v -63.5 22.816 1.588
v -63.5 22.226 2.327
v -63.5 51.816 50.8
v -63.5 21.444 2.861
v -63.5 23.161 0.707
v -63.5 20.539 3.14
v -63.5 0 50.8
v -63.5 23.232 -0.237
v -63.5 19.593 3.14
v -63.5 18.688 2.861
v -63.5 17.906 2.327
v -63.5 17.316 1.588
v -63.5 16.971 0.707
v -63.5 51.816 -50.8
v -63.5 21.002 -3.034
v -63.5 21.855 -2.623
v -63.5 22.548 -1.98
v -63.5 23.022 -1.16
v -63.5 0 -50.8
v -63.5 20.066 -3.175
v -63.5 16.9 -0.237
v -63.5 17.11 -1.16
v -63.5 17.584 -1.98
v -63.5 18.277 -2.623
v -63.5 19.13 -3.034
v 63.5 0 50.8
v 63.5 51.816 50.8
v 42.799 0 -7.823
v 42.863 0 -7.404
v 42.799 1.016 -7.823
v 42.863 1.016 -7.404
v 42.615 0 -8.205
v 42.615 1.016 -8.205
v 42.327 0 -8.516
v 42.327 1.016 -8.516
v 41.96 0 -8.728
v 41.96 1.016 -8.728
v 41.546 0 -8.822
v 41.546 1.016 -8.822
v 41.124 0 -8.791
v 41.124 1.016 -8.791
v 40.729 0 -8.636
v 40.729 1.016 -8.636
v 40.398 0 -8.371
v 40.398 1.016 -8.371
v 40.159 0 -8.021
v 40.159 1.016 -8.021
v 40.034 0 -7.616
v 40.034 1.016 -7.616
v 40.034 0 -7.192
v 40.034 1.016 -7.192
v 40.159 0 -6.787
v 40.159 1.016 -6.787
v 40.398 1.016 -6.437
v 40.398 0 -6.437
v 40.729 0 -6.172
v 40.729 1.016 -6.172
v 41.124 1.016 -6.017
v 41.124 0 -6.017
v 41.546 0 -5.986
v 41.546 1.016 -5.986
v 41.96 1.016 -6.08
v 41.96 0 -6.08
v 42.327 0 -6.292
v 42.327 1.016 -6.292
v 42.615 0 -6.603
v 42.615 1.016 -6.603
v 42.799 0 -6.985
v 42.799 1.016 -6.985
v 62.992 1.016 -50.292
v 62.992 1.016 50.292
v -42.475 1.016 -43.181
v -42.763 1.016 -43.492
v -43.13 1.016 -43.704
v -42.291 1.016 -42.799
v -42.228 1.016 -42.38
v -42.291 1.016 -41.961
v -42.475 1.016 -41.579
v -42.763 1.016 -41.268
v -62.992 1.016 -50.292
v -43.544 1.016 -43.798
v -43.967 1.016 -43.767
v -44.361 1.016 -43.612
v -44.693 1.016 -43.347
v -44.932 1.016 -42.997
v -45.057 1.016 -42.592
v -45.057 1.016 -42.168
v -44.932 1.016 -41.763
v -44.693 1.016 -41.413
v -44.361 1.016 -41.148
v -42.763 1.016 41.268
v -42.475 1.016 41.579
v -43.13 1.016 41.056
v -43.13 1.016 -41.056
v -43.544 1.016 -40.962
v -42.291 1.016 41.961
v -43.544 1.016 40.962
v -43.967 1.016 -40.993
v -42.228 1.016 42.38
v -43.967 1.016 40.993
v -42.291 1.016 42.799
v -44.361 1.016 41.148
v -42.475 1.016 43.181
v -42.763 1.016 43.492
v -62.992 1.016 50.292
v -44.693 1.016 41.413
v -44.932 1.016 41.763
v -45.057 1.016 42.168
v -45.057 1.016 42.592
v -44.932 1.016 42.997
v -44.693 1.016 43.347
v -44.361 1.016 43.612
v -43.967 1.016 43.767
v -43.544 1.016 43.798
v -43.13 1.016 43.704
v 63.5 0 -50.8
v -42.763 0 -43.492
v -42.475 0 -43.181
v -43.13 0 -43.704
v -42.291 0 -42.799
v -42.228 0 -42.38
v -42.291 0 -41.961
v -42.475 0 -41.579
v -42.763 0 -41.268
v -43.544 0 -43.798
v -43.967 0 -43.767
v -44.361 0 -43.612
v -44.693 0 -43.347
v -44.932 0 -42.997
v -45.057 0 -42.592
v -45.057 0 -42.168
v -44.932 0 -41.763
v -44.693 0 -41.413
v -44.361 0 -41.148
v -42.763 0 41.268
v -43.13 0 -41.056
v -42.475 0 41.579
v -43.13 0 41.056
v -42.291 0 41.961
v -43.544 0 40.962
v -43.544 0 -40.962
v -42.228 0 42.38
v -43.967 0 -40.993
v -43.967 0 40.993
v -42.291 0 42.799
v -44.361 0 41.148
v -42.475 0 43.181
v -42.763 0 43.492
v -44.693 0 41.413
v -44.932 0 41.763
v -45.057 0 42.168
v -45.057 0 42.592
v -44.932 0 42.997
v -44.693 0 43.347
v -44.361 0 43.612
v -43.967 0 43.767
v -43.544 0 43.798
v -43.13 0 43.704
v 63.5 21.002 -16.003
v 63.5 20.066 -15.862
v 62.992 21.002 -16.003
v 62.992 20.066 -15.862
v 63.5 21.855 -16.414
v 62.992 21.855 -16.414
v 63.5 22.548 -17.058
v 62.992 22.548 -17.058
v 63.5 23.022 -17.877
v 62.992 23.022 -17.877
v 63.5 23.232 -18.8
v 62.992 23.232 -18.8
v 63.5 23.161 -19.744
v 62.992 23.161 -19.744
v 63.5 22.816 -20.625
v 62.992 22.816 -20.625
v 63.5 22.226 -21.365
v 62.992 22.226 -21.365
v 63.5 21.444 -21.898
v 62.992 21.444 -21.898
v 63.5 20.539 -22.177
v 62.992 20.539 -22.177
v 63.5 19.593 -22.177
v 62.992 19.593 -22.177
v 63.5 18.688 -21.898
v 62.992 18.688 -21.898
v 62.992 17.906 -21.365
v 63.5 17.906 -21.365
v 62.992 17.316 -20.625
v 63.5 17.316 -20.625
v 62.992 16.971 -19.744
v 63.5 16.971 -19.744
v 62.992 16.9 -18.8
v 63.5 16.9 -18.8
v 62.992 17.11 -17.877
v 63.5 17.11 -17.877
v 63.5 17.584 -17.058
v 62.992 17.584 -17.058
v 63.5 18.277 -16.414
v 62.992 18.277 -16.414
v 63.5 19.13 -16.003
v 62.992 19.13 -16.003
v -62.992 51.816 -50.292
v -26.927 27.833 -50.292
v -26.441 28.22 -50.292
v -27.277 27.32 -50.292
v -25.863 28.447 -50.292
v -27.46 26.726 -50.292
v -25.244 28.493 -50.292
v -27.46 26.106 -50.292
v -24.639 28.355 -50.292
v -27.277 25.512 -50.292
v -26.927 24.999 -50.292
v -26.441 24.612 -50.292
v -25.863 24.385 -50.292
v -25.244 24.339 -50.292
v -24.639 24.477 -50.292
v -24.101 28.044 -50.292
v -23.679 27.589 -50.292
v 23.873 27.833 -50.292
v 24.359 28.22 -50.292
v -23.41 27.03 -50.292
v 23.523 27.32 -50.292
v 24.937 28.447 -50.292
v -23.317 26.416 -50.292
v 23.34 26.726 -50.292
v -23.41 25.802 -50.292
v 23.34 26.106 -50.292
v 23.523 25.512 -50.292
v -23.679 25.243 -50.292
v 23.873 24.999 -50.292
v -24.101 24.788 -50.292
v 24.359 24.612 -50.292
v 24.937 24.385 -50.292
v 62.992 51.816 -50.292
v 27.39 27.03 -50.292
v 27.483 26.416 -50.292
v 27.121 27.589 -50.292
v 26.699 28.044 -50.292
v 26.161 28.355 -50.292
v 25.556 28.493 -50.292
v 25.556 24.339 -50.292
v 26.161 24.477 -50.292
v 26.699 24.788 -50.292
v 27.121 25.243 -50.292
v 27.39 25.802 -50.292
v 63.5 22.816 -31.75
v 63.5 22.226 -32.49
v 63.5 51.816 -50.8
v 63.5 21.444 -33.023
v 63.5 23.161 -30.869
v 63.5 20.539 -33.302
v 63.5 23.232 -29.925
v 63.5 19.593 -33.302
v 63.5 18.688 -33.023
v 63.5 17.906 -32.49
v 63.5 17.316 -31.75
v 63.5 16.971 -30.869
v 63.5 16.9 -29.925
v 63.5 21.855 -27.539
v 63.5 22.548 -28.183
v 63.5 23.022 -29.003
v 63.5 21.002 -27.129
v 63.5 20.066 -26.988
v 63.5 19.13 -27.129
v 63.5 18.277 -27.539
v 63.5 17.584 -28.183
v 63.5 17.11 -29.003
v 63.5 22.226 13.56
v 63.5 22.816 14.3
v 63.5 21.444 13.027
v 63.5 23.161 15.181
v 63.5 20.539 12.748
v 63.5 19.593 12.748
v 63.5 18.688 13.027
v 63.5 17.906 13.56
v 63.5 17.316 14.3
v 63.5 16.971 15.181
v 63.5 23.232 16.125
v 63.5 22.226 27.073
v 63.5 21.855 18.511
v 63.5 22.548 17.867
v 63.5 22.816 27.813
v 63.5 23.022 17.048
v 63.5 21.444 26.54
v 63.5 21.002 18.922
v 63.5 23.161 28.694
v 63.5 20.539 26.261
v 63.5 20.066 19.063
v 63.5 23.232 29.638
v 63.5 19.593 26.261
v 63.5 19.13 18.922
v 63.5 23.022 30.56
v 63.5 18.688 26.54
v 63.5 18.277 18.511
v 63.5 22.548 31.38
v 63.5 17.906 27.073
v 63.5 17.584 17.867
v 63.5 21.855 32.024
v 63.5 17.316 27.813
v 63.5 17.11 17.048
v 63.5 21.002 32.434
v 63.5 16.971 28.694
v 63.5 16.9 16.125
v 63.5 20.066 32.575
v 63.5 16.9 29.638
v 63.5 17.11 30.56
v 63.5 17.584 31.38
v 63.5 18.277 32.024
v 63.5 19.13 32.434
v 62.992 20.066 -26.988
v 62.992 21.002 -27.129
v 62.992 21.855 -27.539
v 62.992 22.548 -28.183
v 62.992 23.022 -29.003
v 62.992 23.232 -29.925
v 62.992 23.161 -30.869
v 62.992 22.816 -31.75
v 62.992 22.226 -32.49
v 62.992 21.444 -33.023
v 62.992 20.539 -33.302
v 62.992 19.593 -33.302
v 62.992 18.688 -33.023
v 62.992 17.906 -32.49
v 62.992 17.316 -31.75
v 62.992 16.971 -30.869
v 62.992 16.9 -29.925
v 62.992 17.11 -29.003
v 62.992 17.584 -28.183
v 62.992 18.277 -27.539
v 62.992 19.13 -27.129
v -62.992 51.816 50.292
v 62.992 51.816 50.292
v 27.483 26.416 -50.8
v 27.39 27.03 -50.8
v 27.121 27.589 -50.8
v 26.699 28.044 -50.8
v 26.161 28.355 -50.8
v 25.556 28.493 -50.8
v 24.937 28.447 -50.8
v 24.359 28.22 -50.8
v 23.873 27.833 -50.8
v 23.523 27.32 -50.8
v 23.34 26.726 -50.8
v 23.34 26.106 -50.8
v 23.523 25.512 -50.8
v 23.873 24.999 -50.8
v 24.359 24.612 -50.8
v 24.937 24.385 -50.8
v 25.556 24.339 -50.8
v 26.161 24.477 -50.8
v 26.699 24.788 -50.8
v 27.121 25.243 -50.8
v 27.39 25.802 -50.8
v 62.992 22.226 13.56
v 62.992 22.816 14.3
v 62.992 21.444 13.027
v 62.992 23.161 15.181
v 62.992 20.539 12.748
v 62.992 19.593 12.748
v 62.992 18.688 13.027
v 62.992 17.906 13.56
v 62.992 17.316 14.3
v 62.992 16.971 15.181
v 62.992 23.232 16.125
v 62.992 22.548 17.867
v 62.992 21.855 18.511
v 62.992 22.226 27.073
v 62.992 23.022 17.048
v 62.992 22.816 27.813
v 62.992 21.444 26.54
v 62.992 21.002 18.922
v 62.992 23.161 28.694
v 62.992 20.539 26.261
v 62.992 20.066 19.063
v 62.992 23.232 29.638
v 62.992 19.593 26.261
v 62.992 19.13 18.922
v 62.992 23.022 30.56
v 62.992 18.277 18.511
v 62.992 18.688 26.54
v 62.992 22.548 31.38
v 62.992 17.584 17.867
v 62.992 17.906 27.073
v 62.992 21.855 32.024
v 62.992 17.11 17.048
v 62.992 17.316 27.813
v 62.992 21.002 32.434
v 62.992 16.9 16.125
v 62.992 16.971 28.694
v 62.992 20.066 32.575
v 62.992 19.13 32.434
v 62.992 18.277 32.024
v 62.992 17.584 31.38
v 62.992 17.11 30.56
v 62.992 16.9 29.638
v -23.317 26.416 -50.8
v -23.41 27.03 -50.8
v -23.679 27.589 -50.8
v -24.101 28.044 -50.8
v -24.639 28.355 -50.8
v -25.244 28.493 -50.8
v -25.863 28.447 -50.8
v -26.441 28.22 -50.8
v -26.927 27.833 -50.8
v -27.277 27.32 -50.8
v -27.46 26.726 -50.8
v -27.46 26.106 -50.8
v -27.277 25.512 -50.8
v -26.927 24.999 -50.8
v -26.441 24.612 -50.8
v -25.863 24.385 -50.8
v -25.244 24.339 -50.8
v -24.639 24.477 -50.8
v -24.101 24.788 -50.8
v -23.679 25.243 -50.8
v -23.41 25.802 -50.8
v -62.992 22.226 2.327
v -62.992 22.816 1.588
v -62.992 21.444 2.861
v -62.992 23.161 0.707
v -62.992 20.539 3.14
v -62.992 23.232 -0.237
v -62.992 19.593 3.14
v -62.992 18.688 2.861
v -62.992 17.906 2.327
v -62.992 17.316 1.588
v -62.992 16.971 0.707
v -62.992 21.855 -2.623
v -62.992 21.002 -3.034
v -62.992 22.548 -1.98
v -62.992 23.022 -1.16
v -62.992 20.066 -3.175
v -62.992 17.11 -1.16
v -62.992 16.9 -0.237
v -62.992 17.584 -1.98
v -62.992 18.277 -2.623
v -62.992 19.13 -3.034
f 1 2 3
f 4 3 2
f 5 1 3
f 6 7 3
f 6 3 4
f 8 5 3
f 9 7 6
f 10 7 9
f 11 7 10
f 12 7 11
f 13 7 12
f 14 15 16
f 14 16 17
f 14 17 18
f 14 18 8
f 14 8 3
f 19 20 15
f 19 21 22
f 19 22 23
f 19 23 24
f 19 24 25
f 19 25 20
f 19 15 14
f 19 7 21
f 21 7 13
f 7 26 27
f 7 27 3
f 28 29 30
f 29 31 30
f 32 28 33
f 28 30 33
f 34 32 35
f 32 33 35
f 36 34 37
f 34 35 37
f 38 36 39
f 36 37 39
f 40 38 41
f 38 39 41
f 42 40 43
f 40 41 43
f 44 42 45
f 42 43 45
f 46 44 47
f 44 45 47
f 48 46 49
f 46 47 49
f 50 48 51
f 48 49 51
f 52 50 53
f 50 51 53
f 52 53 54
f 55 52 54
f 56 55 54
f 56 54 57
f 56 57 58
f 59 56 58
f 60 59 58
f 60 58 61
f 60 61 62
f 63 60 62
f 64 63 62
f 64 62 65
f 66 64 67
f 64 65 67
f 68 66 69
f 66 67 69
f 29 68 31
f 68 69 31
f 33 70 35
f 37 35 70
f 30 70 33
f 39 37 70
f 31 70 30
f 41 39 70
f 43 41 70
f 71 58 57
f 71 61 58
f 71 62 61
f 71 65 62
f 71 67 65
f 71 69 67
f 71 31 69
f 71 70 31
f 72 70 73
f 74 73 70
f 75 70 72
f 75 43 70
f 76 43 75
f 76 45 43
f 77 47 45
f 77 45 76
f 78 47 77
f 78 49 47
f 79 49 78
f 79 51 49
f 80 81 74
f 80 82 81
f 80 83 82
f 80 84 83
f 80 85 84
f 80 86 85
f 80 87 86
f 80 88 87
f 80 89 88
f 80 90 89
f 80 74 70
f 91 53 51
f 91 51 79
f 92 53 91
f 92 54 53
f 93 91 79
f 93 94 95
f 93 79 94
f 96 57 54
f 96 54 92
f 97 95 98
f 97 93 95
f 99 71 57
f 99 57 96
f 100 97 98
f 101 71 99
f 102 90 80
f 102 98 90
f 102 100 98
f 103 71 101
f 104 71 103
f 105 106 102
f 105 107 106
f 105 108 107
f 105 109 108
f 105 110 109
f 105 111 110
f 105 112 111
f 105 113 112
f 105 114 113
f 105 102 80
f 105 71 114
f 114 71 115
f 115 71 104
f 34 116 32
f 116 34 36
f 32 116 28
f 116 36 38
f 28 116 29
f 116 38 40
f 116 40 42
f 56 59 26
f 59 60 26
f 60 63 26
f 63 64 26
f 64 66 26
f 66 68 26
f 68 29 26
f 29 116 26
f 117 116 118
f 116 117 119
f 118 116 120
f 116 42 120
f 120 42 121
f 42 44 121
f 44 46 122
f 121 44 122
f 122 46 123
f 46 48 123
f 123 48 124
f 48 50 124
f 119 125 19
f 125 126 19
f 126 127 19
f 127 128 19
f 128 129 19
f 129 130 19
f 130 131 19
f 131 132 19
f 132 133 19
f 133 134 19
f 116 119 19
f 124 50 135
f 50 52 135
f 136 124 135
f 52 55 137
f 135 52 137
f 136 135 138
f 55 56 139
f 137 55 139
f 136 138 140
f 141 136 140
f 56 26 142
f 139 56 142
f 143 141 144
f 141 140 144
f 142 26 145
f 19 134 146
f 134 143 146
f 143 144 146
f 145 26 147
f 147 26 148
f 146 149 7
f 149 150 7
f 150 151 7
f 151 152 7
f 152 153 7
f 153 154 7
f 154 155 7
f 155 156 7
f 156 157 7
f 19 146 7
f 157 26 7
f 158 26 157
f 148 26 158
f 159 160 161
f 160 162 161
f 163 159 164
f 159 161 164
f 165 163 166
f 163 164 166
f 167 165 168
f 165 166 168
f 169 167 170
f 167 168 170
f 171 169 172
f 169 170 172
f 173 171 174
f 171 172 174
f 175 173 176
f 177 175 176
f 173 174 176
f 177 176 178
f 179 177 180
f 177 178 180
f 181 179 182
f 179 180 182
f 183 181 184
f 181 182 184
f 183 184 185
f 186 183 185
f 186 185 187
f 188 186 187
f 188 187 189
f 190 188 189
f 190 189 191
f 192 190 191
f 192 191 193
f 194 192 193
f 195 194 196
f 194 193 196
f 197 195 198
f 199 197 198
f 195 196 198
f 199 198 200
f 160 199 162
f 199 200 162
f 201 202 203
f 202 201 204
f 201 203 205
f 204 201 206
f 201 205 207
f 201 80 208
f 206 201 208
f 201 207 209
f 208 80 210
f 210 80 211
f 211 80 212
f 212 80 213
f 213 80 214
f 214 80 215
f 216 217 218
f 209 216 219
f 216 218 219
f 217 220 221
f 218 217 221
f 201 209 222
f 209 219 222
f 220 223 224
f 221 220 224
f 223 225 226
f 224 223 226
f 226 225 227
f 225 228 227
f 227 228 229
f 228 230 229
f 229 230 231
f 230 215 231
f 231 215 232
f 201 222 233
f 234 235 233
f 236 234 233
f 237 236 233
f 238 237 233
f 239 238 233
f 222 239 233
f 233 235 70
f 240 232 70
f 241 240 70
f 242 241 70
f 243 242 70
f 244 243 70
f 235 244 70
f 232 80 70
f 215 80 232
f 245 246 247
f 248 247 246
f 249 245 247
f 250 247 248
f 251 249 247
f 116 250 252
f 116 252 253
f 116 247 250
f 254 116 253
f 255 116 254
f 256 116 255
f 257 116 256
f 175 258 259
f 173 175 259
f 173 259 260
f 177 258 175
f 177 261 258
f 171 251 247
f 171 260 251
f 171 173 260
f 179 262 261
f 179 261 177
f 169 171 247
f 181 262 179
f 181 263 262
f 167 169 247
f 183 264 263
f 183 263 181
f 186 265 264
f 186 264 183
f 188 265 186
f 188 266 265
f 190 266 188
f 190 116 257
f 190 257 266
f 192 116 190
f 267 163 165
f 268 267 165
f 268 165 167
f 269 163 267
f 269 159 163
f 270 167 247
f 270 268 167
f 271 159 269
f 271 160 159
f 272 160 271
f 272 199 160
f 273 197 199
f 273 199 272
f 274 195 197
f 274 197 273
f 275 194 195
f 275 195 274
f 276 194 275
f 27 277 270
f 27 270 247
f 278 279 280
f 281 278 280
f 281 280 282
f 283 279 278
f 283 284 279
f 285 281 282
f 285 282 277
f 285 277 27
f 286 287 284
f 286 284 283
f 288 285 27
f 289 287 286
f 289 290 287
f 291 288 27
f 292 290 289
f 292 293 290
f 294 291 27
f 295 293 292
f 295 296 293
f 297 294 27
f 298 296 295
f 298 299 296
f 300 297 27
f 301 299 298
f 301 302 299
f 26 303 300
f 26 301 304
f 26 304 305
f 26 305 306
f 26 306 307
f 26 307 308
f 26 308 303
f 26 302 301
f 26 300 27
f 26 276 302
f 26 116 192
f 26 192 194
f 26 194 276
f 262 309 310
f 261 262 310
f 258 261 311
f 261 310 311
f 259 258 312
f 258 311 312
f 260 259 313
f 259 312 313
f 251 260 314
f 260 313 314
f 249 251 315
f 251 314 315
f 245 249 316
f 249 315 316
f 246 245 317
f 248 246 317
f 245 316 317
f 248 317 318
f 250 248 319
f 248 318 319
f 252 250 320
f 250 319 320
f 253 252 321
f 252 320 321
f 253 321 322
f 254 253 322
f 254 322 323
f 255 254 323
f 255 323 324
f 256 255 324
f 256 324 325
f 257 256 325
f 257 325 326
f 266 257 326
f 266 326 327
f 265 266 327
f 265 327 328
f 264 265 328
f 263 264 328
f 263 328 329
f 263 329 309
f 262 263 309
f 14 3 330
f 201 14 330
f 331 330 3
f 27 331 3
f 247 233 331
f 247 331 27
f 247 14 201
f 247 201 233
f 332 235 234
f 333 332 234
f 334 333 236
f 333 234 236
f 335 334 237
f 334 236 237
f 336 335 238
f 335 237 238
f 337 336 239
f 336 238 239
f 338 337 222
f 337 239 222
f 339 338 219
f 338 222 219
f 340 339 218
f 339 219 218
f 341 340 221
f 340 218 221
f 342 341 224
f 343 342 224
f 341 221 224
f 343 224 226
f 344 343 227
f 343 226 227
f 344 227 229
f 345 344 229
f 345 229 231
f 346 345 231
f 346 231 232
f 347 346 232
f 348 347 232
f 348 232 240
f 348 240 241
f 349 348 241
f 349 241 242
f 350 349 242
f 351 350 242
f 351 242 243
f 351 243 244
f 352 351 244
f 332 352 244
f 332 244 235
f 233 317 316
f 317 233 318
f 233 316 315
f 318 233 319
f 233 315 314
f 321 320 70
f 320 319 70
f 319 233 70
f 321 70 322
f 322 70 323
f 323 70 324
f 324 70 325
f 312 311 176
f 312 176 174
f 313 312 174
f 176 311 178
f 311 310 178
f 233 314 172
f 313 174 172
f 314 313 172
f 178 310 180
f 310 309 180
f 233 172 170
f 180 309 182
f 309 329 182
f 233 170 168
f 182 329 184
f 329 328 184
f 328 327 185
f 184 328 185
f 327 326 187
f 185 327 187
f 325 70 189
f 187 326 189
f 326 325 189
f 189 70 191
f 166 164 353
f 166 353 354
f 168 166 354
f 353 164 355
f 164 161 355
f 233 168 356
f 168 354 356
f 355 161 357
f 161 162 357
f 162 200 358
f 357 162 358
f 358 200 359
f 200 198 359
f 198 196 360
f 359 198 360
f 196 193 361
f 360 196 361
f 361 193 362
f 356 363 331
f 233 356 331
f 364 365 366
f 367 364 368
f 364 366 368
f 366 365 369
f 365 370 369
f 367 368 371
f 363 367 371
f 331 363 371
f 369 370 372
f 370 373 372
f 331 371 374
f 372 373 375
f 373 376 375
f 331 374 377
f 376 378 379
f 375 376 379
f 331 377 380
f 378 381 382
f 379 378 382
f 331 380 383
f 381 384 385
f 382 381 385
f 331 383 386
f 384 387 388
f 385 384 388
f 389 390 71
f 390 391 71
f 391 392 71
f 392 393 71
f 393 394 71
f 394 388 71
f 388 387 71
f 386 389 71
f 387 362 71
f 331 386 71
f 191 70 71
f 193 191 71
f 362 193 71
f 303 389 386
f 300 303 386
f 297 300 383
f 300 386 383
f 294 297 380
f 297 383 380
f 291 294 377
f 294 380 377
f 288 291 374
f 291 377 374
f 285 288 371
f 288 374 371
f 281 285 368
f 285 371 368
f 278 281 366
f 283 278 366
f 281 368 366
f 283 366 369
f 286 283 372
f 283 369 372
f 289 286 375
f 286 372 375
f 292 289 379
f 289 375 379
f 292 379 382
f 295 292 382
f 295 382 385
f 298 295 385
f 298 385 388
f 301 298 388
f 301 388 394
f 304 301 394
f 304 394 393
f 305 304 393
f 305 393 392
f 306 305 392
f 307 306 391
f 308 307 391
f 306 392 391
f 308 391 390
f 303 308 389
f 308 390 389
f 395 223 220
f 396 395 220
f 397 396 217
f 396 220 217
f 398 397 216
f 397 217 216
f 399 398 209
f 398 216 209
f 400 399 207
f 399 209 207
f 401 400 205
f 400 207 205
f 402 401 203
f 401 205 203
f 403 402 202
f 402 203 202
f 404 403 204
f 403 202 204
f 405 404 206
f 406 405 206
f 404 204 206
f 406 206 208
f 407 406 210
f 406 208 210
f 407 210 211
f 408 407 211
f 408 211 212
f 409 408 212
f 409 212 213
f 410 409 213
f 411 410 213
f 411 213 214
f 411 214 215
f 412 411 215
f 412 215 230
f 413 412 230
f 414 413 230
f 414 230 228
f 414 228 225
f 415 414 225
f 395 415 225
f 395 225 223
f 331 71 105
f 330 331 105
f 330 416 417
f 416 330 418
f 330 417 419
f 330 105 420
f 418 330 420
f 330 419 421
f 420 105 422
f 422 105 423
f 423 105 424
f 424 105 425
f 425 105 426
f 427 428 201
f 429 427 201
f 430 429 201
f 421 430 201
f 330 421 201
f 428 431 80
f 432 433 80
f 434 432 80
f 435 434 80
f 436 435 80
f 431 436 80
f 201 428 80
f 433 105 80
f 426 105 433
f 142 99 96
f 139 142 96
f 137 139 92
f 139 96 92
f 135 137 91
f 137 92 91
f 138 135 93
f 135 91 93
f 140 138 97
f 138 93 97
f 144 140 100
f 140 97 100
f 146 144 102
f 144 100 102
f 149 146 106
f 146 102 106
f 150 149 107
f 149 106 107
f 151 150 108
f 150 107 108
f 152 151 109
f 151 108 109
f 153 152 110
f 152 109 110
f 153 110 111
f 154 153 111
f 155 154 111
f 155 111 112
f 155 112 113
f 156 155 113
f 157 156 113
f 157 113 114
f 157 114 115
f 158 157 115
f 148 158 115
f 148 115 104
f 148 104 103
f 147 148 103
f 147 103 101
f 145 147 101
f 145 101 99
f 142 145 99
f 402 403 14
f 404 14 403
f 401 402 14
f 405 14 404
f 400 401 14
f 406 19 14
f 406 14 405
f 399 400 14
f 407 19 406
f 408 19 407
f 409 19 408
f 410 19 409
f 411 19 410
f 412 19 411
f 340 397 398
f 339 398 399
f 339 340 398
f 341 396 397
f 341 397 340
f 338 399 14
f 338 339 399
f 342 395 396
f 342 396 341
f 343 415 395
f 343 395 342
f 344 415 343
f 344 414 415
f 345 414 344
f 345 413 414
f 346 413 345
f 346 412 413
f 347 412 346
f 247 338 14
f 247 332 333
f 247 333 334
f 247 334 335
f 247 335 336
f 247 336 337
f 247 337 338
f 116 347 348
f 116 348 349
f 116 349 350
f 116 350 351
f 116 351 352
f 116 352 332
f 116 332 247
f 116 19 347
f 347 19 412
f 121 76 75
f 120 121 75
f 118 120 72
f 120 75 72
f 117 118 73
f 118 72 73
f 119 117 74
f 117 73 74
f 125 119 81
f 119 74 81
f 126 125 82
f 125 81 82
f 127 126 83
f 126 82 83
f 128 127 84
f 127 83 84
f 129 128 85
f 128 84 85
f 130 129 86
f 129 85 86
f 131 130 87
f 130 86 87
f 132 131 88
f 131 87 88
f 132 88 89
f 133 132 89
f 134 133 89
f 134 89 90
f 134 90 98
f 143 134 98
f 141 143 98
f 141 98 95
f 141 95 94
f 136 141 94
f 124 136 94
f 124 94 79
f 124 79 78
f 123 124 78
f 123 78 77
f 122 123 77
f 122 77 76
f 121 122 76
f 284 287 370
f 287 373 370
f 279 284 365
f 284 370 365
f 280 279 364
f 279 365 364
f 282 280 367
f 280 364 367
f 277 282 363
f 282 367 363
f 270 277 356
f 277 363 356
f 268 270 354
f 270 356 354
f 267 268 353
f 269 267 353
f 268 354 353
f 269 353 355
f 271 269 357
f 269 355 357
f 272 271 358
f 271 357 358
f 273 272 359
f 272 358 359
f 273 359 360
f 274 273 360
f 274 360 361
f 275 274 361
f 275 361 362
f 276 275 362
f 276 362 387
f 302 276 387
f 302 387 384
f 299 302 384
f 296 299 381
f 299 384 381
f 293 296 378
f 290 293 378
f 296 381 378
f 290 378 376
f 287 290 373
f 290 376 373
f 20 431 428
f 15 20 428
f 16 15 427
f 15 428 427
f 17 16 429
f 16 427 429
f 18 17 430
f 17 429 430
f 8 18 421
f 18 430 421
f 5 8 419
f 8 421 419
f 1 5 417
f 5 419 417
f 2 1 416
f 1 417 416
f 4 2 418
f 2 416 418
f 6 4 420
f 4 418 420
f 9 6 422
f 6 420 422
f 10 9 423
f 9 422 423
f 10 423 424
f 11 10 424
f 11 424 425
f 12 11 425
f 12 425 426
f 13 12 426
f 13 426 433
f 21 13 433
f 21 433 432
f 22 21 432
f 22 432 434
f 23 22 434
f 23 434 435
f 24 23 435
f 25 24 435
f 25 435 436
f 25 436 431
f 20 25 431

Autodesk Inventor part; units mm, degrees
ref_plane "YZ Plane" through (0, 0, 0) normal (1, 0, 0) x (0, 1, 0)
ref_plane "XZ Plane" through (0, 0, 0) normal (0, 1, 0) x (-1, 0, 0)
ref_plane "XY Plane" through (0, 0, 0) normal (0, 0, 1) x (1, 0, 0)
sketch "Sketch1" plane through (0, 0, 0) normal (0, 1, 0) x (-1, 0, 0)
  line L0 (-63.5, 50.8) -> (63.5, 50.8)
  line L1 (63.5, 50.8) -> (63.5, -50.8)
  line L2 (63.5, -50.8) -> (-63.5, -50.8)
  line L3 (-63.5, -50.8) -> (-63.5, 50.8)
  line L4 (-63.5, 50.8) -> (63.5, -50.8) construction
  line L5 (63.5, 50.8) -> (-63.5, -50.8) construction
  point P0 (0, 0)
  dimension "d0" = 127
  dimension "d1" = 101.6
extrude "Extrusion1" add sketch "Sketch1" along normal blind 1.016
sketch "Sketch2" plane through (0, 1.016, 0) normal (0, 1, 0) x (1, 0, 0)
  line L0 (63.5, 50.8) -> (-63.5, 50.8) projected
  line L1 (63.5, -50.8) -> (-63.5, -50.8)
  line L2 (-63.5, -50.8) -> (-63.5, 50.8)
  line L3 (-63.5, 50.8) -> (63.5, 50.8)
  line L4 (63.5, 50.8) -> (63.5, -50.8)
  line L5 (63.5, -50.8) -> (-63.5, 50.8) construction
  line L6 (-63.5, -50.8) -> (63.5, 50.8) construction
  line L7 (62.992, -50.292) -> (-62.992, -50.292)
  line L8 (-62.992, -50.292) -> (-62.992, 50.292)
  line L9 (-62.992, 50.292) -> (62.992, 50.292)
  line L10 (62.992, 50.292) -> (62.992, -50.292)
  line L11 (62.992, -50.292) -> (-62.992, 50.292) construction
  line L12 (-62.992, -50.292) -> (62.992, 50.292) construction
  point P0 (0, 0)
  dimension "d4" = 125.984
  dimension "d5" = 100.584
extrude "Extrusion2" add sketch "Sketch2" along normal blind 50.8
sketch "Sketch3" plane through (-62.992, 1.016, -50.292) normal (0, 0, 1) x (1, 0, 0)
  line L0 (0, 0) -> (0, 50.8) projected
  circle A0 centre (37.592, 25.4) radius 2.0828
  circle A1 centre (88.392, 25.4) radius 2.0828
  point P0 (62.992, -1.016)
  dimension "d10" = 4.1656
  dimension "d12" = 4.1656
extrude "Extrusion3" cut sketch "Sketch3" against normal through all
sketch "Sketch4" plane through (0, 1.016, 0) normal (0, 1, 0) x (1, 0, 0)
  line L0 (50, -50) -> (-50, 50) construction
  line L1 (-50, -50) -> (50, 50) construction
  circle A0 centre (-43.65, -42.38) radius 1.4224
  circle A1 centre (-43.65, 42.38) radius 1.4224
  circle A2 centre (41.4402, 7.404) radius 1.4224
  point P0 (0, 0)
  dimension "d15" = 100
  dimension "d16" = 100
  dimension "d23" = 2.8448
  dimension "d24" = 2.8448
  dimension "d25" = 2.8448
extrude "Extrusion4" cut sketch "Sketch4" against normal through all
sketch "Sketch5" plane through (-62.992, 1.016, 50.292) normal (1, 0, 0) x (0, 0, -1)
  circle A0 centre (50.292, 19.05) radius 3.175
  point P0 (50.292, -1.016)
  dimension "d28" = 6.35
extrude "Extrusion5" cut sketch "Sketch5" against normal through all
sketch "Sketch6" plane through (62.992, 1.016, -50.292) normal (-1, 0, 0) x (0, 0, 1)
  line L0 (0, 0) -> (0, 50.8) projected
  line L1 (0, 19.05) -> (0.2921, 19.05)
  line L2 (0, 19.05) -> (0.2921, 19.05) construction
  line L3 (0.2921, 19.05) -> (20.1295, 19.05)
  line L4 (20.1295, 19.05) -> (31.2547, 19.05)
  line L5 (20.1295, 19.05) -> (31.2547, 19.05) construction
  line L6 (31.2547, 19.05) -> (66.1797, 19.05)
  line L7 (31.2547, 19.05) -> (66.1797, 19.05) construction
  line L8 (66.1797, 19.05) -> (79.6925, 19.05)
  line L9 (66.1797, 19.05) -> (79.6925, 19.05) construction
  circle A0 centre (20.1295, 19.05) radius 3.175
  circle A1 centre (31.2547, 19.05) radius 3.175
  circle A2 centre (66.1797, 19.05) radius 3.175
  circle A3 centre (79.6925, 19.05) radius 3.175
  point P0 (50.292, -1.016)
  dimension "d31" = 0.2921
  dimension "d32" = 0
  dimension "d33" = 19.8374
  dimension "d34" = 11.1252
  dimension "d35" = 0
  dimension "d36" = 34.925
  dimension "d37" = 0
  dimension "d38" = 13.5128
  dimension "d39" = 0
  dimension "d40" = 6.35
  dimension "d41" = 6.35
  dimension "d42" = 6.35
  dimension "d43" = 6.35
extrude "Extrusion6" cut sketch "Sketch6" against normal through all
equation "\"d29\" = d25"
properties part number "563-AC-1404-4xSplitter"
